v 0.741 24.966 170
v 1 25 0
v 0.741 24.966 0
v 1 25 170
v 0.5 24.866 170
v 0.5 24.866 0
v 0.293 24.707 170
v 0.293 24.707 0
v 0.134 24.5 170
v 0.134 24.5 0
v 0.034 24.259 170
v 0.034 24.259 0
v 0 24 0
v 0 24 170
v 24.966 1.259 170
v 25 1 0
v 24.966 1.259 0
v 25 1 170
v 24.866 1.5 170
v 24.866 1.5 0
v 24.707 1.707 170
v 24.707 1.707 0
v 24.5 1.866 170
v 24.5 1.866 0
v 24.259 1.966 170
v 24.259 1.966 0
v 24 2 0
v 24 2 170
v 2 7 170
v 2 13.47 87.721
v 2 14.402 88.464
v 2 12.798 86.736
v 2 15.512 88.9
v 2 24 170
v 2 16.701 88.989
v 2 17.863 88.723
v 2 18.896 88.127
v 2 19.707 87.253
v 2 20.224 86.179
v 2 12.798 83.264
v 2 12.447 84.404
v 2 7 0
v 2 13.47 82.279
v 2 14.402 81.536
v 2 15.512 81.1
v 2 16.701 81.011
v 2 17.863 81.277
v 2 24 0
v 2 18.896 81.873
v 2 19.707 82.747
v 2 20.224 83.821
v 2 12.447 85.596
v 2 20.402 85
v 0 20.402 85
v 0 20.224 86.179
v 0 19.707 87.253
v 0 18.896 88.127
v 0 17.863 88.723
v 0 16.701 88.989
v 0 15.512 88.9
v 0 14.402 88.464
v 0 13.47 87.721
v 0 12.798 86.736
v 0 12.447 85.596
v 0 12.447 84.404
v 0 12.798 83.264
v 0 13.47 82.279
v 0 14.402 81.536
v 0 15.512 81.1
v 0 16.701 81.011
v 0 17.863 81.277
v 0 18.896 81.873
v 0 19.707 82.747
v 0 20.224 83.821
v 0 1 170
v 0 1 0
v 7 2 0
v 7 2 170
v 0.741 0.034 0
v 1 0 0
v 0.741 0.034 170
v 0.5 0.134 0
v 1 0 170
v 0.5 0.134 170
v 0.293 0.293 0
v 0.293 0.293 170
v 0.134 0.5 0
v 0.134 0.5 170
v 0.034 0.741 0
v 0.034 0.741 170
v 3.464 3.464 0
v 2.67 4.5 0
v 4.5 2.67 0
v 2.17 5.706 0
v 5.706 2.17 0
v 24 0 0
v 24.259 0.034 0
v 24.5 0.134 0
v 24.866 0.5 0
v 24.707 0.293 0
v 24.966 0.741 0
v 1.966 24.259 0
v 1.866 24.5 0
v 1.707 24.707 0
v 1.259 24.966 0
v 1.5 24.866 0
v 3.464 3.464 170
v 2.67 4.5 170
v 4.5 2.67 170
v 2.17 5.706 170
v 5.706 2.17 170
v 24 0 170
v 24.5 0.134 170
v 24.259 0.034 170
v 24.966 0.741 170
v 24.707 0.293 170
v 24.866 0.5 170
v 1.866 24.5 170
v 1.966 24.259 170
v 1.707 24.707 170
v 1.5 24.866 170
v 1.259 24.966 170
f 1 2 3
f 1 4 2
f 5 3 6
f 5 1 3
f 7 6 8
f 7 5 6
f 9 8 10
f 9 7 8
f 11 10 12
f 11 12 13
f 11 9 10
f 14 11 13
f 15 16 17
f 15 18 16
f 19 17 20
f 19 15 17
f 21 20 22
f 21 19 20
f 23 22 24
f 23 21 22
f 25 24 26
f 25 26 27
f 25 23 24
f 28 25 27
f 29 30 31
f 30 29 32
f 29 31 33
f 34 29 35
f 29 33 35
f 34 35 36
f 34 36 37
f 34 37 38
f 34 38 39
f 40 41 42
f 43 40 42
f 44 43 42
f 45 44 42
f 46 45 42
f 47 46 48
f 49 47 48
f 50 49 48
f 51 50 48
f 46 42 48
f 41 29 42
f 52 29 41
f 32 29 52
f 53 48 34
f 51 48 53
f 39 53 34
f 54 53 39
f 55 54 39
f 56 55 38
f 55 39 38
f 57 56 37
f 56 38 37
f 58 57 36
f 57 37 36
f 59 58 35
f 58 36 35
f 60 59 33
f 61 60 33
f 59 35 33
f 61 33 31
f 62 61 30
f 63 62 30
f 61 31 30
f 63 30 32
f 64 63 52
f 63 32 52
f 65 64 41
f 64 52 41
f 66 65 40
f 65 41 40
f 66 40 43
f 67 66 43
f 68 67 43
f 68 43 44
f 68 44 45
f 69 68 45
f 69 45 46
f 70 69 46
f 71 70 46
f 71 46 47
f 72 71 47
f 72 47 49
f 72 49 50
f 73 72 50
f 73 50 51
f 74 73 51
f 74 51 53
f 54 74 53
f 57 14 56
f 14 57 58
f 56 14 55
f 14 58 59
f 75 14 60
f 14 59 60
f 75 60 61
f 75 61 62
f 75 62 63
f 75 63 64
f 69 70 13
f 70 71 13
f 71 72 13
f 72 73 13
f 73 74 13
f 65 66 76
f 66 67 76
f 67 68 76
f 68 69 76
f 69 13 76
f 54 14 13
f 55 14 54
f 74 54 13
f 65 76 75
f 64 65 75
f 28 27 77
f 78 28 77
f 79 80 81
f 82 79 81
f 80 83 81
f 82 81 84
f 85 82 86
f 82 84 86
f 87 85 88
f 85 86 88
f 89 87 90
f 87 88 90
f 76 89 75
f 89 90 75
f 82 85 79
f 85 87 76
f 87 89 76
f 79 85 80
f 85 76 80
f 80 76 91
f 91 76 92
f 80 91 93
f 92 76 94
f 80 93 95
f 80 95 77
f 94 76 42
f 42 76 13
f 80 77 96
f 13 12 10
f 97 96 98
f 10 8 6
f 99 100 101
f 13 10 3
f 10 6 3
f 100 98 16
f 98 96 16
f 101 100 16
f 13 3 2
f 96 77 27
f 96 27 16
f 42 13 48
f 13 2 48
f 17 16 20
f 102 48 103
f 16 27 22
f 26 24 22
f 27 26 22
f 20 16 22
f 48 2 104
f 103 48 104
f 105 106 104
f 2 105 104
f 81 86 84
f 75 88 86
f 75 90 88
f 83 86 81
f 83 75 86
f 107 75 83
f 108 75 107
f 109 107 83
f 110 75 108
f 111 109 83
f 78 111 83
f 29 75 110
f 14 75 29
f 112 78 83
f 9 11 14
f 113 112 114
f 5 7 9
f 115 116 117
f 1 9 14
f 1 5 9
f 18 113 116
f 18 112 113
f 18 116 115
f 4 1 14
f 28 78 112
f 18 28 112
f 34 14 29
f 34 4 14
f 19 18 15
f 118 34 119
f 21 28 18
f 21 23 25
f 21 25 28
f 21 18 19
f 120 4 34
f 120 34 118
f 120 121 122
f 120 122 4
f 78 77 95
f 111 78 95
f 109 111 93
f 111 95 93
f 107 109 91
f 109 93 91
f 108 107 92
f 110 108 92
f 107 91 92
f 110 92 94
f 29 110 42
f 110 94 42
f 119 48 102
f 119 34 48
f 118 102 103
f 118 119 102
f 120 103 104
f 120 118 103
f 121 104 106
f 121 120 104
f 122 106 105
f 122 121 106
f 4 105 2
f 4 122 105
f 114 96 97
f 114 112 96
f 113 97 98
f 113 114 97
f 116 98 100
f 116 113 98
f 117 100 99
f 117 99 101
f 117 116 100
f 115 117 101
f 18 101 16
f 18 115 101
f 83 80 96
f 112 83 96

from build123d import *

# Parameters (mm, degrees)
EXTRUDE_1_DEPTH     = 170
FILLET_1_R          = 1
SKETCH_2_R          = 4
CUT_EXTRUDE_1_DEPTH = 174.360895245


with BuildPart() as part:
    # 草图1 → 凸台-拉伸1 (new body)
    with BuildSketch(Plane.XY):
        with BuildLine():
            Line((0, 0), (25, 0))
            Line((25, 0), (25, 2))
            Line((25, 2), (7, 2))
            ThreePointArc((7, 2), (3.464466094, 3.464466094), (2, 7))
            Line((2, 7), (2, 25))
            Line((2, 25), (0, 25))
            Line((0, 25), (0, 0))
        make_face()
    extrude(amount=EXTRUDE_1_DEPTH)

    # 圆角1
    fillet_1_edges = [part.edges().sort_by_distance(p)[0] for p in [
        (0, 25, 85),
        (25, 2, 85),
        (25, 0, 85),
        (0, 0, 85),
        (2, 25, 85),
    ]]
    fillet(fillet_1_edges, radius=FILLET_1_R - 0.0001)  # a hair under: the kernel refuses the full size

    # 草图2 → 切除-拉伸1 (cut, through all)
    with BuildSketch(Plane(origin=(2, 0, 0), x_dir=(0, 0, -1), z_dir=(1, 0, 0))):
        with Locations(Location((-85, 16.401885755, 0), (0, 0, 90))):
            Circle(SKETCH_2_R)
    extrude(amount=-CUT_EXTRUDE_1_DEPTH, mode=Mode.SUBTRACT)


solid = part.part
